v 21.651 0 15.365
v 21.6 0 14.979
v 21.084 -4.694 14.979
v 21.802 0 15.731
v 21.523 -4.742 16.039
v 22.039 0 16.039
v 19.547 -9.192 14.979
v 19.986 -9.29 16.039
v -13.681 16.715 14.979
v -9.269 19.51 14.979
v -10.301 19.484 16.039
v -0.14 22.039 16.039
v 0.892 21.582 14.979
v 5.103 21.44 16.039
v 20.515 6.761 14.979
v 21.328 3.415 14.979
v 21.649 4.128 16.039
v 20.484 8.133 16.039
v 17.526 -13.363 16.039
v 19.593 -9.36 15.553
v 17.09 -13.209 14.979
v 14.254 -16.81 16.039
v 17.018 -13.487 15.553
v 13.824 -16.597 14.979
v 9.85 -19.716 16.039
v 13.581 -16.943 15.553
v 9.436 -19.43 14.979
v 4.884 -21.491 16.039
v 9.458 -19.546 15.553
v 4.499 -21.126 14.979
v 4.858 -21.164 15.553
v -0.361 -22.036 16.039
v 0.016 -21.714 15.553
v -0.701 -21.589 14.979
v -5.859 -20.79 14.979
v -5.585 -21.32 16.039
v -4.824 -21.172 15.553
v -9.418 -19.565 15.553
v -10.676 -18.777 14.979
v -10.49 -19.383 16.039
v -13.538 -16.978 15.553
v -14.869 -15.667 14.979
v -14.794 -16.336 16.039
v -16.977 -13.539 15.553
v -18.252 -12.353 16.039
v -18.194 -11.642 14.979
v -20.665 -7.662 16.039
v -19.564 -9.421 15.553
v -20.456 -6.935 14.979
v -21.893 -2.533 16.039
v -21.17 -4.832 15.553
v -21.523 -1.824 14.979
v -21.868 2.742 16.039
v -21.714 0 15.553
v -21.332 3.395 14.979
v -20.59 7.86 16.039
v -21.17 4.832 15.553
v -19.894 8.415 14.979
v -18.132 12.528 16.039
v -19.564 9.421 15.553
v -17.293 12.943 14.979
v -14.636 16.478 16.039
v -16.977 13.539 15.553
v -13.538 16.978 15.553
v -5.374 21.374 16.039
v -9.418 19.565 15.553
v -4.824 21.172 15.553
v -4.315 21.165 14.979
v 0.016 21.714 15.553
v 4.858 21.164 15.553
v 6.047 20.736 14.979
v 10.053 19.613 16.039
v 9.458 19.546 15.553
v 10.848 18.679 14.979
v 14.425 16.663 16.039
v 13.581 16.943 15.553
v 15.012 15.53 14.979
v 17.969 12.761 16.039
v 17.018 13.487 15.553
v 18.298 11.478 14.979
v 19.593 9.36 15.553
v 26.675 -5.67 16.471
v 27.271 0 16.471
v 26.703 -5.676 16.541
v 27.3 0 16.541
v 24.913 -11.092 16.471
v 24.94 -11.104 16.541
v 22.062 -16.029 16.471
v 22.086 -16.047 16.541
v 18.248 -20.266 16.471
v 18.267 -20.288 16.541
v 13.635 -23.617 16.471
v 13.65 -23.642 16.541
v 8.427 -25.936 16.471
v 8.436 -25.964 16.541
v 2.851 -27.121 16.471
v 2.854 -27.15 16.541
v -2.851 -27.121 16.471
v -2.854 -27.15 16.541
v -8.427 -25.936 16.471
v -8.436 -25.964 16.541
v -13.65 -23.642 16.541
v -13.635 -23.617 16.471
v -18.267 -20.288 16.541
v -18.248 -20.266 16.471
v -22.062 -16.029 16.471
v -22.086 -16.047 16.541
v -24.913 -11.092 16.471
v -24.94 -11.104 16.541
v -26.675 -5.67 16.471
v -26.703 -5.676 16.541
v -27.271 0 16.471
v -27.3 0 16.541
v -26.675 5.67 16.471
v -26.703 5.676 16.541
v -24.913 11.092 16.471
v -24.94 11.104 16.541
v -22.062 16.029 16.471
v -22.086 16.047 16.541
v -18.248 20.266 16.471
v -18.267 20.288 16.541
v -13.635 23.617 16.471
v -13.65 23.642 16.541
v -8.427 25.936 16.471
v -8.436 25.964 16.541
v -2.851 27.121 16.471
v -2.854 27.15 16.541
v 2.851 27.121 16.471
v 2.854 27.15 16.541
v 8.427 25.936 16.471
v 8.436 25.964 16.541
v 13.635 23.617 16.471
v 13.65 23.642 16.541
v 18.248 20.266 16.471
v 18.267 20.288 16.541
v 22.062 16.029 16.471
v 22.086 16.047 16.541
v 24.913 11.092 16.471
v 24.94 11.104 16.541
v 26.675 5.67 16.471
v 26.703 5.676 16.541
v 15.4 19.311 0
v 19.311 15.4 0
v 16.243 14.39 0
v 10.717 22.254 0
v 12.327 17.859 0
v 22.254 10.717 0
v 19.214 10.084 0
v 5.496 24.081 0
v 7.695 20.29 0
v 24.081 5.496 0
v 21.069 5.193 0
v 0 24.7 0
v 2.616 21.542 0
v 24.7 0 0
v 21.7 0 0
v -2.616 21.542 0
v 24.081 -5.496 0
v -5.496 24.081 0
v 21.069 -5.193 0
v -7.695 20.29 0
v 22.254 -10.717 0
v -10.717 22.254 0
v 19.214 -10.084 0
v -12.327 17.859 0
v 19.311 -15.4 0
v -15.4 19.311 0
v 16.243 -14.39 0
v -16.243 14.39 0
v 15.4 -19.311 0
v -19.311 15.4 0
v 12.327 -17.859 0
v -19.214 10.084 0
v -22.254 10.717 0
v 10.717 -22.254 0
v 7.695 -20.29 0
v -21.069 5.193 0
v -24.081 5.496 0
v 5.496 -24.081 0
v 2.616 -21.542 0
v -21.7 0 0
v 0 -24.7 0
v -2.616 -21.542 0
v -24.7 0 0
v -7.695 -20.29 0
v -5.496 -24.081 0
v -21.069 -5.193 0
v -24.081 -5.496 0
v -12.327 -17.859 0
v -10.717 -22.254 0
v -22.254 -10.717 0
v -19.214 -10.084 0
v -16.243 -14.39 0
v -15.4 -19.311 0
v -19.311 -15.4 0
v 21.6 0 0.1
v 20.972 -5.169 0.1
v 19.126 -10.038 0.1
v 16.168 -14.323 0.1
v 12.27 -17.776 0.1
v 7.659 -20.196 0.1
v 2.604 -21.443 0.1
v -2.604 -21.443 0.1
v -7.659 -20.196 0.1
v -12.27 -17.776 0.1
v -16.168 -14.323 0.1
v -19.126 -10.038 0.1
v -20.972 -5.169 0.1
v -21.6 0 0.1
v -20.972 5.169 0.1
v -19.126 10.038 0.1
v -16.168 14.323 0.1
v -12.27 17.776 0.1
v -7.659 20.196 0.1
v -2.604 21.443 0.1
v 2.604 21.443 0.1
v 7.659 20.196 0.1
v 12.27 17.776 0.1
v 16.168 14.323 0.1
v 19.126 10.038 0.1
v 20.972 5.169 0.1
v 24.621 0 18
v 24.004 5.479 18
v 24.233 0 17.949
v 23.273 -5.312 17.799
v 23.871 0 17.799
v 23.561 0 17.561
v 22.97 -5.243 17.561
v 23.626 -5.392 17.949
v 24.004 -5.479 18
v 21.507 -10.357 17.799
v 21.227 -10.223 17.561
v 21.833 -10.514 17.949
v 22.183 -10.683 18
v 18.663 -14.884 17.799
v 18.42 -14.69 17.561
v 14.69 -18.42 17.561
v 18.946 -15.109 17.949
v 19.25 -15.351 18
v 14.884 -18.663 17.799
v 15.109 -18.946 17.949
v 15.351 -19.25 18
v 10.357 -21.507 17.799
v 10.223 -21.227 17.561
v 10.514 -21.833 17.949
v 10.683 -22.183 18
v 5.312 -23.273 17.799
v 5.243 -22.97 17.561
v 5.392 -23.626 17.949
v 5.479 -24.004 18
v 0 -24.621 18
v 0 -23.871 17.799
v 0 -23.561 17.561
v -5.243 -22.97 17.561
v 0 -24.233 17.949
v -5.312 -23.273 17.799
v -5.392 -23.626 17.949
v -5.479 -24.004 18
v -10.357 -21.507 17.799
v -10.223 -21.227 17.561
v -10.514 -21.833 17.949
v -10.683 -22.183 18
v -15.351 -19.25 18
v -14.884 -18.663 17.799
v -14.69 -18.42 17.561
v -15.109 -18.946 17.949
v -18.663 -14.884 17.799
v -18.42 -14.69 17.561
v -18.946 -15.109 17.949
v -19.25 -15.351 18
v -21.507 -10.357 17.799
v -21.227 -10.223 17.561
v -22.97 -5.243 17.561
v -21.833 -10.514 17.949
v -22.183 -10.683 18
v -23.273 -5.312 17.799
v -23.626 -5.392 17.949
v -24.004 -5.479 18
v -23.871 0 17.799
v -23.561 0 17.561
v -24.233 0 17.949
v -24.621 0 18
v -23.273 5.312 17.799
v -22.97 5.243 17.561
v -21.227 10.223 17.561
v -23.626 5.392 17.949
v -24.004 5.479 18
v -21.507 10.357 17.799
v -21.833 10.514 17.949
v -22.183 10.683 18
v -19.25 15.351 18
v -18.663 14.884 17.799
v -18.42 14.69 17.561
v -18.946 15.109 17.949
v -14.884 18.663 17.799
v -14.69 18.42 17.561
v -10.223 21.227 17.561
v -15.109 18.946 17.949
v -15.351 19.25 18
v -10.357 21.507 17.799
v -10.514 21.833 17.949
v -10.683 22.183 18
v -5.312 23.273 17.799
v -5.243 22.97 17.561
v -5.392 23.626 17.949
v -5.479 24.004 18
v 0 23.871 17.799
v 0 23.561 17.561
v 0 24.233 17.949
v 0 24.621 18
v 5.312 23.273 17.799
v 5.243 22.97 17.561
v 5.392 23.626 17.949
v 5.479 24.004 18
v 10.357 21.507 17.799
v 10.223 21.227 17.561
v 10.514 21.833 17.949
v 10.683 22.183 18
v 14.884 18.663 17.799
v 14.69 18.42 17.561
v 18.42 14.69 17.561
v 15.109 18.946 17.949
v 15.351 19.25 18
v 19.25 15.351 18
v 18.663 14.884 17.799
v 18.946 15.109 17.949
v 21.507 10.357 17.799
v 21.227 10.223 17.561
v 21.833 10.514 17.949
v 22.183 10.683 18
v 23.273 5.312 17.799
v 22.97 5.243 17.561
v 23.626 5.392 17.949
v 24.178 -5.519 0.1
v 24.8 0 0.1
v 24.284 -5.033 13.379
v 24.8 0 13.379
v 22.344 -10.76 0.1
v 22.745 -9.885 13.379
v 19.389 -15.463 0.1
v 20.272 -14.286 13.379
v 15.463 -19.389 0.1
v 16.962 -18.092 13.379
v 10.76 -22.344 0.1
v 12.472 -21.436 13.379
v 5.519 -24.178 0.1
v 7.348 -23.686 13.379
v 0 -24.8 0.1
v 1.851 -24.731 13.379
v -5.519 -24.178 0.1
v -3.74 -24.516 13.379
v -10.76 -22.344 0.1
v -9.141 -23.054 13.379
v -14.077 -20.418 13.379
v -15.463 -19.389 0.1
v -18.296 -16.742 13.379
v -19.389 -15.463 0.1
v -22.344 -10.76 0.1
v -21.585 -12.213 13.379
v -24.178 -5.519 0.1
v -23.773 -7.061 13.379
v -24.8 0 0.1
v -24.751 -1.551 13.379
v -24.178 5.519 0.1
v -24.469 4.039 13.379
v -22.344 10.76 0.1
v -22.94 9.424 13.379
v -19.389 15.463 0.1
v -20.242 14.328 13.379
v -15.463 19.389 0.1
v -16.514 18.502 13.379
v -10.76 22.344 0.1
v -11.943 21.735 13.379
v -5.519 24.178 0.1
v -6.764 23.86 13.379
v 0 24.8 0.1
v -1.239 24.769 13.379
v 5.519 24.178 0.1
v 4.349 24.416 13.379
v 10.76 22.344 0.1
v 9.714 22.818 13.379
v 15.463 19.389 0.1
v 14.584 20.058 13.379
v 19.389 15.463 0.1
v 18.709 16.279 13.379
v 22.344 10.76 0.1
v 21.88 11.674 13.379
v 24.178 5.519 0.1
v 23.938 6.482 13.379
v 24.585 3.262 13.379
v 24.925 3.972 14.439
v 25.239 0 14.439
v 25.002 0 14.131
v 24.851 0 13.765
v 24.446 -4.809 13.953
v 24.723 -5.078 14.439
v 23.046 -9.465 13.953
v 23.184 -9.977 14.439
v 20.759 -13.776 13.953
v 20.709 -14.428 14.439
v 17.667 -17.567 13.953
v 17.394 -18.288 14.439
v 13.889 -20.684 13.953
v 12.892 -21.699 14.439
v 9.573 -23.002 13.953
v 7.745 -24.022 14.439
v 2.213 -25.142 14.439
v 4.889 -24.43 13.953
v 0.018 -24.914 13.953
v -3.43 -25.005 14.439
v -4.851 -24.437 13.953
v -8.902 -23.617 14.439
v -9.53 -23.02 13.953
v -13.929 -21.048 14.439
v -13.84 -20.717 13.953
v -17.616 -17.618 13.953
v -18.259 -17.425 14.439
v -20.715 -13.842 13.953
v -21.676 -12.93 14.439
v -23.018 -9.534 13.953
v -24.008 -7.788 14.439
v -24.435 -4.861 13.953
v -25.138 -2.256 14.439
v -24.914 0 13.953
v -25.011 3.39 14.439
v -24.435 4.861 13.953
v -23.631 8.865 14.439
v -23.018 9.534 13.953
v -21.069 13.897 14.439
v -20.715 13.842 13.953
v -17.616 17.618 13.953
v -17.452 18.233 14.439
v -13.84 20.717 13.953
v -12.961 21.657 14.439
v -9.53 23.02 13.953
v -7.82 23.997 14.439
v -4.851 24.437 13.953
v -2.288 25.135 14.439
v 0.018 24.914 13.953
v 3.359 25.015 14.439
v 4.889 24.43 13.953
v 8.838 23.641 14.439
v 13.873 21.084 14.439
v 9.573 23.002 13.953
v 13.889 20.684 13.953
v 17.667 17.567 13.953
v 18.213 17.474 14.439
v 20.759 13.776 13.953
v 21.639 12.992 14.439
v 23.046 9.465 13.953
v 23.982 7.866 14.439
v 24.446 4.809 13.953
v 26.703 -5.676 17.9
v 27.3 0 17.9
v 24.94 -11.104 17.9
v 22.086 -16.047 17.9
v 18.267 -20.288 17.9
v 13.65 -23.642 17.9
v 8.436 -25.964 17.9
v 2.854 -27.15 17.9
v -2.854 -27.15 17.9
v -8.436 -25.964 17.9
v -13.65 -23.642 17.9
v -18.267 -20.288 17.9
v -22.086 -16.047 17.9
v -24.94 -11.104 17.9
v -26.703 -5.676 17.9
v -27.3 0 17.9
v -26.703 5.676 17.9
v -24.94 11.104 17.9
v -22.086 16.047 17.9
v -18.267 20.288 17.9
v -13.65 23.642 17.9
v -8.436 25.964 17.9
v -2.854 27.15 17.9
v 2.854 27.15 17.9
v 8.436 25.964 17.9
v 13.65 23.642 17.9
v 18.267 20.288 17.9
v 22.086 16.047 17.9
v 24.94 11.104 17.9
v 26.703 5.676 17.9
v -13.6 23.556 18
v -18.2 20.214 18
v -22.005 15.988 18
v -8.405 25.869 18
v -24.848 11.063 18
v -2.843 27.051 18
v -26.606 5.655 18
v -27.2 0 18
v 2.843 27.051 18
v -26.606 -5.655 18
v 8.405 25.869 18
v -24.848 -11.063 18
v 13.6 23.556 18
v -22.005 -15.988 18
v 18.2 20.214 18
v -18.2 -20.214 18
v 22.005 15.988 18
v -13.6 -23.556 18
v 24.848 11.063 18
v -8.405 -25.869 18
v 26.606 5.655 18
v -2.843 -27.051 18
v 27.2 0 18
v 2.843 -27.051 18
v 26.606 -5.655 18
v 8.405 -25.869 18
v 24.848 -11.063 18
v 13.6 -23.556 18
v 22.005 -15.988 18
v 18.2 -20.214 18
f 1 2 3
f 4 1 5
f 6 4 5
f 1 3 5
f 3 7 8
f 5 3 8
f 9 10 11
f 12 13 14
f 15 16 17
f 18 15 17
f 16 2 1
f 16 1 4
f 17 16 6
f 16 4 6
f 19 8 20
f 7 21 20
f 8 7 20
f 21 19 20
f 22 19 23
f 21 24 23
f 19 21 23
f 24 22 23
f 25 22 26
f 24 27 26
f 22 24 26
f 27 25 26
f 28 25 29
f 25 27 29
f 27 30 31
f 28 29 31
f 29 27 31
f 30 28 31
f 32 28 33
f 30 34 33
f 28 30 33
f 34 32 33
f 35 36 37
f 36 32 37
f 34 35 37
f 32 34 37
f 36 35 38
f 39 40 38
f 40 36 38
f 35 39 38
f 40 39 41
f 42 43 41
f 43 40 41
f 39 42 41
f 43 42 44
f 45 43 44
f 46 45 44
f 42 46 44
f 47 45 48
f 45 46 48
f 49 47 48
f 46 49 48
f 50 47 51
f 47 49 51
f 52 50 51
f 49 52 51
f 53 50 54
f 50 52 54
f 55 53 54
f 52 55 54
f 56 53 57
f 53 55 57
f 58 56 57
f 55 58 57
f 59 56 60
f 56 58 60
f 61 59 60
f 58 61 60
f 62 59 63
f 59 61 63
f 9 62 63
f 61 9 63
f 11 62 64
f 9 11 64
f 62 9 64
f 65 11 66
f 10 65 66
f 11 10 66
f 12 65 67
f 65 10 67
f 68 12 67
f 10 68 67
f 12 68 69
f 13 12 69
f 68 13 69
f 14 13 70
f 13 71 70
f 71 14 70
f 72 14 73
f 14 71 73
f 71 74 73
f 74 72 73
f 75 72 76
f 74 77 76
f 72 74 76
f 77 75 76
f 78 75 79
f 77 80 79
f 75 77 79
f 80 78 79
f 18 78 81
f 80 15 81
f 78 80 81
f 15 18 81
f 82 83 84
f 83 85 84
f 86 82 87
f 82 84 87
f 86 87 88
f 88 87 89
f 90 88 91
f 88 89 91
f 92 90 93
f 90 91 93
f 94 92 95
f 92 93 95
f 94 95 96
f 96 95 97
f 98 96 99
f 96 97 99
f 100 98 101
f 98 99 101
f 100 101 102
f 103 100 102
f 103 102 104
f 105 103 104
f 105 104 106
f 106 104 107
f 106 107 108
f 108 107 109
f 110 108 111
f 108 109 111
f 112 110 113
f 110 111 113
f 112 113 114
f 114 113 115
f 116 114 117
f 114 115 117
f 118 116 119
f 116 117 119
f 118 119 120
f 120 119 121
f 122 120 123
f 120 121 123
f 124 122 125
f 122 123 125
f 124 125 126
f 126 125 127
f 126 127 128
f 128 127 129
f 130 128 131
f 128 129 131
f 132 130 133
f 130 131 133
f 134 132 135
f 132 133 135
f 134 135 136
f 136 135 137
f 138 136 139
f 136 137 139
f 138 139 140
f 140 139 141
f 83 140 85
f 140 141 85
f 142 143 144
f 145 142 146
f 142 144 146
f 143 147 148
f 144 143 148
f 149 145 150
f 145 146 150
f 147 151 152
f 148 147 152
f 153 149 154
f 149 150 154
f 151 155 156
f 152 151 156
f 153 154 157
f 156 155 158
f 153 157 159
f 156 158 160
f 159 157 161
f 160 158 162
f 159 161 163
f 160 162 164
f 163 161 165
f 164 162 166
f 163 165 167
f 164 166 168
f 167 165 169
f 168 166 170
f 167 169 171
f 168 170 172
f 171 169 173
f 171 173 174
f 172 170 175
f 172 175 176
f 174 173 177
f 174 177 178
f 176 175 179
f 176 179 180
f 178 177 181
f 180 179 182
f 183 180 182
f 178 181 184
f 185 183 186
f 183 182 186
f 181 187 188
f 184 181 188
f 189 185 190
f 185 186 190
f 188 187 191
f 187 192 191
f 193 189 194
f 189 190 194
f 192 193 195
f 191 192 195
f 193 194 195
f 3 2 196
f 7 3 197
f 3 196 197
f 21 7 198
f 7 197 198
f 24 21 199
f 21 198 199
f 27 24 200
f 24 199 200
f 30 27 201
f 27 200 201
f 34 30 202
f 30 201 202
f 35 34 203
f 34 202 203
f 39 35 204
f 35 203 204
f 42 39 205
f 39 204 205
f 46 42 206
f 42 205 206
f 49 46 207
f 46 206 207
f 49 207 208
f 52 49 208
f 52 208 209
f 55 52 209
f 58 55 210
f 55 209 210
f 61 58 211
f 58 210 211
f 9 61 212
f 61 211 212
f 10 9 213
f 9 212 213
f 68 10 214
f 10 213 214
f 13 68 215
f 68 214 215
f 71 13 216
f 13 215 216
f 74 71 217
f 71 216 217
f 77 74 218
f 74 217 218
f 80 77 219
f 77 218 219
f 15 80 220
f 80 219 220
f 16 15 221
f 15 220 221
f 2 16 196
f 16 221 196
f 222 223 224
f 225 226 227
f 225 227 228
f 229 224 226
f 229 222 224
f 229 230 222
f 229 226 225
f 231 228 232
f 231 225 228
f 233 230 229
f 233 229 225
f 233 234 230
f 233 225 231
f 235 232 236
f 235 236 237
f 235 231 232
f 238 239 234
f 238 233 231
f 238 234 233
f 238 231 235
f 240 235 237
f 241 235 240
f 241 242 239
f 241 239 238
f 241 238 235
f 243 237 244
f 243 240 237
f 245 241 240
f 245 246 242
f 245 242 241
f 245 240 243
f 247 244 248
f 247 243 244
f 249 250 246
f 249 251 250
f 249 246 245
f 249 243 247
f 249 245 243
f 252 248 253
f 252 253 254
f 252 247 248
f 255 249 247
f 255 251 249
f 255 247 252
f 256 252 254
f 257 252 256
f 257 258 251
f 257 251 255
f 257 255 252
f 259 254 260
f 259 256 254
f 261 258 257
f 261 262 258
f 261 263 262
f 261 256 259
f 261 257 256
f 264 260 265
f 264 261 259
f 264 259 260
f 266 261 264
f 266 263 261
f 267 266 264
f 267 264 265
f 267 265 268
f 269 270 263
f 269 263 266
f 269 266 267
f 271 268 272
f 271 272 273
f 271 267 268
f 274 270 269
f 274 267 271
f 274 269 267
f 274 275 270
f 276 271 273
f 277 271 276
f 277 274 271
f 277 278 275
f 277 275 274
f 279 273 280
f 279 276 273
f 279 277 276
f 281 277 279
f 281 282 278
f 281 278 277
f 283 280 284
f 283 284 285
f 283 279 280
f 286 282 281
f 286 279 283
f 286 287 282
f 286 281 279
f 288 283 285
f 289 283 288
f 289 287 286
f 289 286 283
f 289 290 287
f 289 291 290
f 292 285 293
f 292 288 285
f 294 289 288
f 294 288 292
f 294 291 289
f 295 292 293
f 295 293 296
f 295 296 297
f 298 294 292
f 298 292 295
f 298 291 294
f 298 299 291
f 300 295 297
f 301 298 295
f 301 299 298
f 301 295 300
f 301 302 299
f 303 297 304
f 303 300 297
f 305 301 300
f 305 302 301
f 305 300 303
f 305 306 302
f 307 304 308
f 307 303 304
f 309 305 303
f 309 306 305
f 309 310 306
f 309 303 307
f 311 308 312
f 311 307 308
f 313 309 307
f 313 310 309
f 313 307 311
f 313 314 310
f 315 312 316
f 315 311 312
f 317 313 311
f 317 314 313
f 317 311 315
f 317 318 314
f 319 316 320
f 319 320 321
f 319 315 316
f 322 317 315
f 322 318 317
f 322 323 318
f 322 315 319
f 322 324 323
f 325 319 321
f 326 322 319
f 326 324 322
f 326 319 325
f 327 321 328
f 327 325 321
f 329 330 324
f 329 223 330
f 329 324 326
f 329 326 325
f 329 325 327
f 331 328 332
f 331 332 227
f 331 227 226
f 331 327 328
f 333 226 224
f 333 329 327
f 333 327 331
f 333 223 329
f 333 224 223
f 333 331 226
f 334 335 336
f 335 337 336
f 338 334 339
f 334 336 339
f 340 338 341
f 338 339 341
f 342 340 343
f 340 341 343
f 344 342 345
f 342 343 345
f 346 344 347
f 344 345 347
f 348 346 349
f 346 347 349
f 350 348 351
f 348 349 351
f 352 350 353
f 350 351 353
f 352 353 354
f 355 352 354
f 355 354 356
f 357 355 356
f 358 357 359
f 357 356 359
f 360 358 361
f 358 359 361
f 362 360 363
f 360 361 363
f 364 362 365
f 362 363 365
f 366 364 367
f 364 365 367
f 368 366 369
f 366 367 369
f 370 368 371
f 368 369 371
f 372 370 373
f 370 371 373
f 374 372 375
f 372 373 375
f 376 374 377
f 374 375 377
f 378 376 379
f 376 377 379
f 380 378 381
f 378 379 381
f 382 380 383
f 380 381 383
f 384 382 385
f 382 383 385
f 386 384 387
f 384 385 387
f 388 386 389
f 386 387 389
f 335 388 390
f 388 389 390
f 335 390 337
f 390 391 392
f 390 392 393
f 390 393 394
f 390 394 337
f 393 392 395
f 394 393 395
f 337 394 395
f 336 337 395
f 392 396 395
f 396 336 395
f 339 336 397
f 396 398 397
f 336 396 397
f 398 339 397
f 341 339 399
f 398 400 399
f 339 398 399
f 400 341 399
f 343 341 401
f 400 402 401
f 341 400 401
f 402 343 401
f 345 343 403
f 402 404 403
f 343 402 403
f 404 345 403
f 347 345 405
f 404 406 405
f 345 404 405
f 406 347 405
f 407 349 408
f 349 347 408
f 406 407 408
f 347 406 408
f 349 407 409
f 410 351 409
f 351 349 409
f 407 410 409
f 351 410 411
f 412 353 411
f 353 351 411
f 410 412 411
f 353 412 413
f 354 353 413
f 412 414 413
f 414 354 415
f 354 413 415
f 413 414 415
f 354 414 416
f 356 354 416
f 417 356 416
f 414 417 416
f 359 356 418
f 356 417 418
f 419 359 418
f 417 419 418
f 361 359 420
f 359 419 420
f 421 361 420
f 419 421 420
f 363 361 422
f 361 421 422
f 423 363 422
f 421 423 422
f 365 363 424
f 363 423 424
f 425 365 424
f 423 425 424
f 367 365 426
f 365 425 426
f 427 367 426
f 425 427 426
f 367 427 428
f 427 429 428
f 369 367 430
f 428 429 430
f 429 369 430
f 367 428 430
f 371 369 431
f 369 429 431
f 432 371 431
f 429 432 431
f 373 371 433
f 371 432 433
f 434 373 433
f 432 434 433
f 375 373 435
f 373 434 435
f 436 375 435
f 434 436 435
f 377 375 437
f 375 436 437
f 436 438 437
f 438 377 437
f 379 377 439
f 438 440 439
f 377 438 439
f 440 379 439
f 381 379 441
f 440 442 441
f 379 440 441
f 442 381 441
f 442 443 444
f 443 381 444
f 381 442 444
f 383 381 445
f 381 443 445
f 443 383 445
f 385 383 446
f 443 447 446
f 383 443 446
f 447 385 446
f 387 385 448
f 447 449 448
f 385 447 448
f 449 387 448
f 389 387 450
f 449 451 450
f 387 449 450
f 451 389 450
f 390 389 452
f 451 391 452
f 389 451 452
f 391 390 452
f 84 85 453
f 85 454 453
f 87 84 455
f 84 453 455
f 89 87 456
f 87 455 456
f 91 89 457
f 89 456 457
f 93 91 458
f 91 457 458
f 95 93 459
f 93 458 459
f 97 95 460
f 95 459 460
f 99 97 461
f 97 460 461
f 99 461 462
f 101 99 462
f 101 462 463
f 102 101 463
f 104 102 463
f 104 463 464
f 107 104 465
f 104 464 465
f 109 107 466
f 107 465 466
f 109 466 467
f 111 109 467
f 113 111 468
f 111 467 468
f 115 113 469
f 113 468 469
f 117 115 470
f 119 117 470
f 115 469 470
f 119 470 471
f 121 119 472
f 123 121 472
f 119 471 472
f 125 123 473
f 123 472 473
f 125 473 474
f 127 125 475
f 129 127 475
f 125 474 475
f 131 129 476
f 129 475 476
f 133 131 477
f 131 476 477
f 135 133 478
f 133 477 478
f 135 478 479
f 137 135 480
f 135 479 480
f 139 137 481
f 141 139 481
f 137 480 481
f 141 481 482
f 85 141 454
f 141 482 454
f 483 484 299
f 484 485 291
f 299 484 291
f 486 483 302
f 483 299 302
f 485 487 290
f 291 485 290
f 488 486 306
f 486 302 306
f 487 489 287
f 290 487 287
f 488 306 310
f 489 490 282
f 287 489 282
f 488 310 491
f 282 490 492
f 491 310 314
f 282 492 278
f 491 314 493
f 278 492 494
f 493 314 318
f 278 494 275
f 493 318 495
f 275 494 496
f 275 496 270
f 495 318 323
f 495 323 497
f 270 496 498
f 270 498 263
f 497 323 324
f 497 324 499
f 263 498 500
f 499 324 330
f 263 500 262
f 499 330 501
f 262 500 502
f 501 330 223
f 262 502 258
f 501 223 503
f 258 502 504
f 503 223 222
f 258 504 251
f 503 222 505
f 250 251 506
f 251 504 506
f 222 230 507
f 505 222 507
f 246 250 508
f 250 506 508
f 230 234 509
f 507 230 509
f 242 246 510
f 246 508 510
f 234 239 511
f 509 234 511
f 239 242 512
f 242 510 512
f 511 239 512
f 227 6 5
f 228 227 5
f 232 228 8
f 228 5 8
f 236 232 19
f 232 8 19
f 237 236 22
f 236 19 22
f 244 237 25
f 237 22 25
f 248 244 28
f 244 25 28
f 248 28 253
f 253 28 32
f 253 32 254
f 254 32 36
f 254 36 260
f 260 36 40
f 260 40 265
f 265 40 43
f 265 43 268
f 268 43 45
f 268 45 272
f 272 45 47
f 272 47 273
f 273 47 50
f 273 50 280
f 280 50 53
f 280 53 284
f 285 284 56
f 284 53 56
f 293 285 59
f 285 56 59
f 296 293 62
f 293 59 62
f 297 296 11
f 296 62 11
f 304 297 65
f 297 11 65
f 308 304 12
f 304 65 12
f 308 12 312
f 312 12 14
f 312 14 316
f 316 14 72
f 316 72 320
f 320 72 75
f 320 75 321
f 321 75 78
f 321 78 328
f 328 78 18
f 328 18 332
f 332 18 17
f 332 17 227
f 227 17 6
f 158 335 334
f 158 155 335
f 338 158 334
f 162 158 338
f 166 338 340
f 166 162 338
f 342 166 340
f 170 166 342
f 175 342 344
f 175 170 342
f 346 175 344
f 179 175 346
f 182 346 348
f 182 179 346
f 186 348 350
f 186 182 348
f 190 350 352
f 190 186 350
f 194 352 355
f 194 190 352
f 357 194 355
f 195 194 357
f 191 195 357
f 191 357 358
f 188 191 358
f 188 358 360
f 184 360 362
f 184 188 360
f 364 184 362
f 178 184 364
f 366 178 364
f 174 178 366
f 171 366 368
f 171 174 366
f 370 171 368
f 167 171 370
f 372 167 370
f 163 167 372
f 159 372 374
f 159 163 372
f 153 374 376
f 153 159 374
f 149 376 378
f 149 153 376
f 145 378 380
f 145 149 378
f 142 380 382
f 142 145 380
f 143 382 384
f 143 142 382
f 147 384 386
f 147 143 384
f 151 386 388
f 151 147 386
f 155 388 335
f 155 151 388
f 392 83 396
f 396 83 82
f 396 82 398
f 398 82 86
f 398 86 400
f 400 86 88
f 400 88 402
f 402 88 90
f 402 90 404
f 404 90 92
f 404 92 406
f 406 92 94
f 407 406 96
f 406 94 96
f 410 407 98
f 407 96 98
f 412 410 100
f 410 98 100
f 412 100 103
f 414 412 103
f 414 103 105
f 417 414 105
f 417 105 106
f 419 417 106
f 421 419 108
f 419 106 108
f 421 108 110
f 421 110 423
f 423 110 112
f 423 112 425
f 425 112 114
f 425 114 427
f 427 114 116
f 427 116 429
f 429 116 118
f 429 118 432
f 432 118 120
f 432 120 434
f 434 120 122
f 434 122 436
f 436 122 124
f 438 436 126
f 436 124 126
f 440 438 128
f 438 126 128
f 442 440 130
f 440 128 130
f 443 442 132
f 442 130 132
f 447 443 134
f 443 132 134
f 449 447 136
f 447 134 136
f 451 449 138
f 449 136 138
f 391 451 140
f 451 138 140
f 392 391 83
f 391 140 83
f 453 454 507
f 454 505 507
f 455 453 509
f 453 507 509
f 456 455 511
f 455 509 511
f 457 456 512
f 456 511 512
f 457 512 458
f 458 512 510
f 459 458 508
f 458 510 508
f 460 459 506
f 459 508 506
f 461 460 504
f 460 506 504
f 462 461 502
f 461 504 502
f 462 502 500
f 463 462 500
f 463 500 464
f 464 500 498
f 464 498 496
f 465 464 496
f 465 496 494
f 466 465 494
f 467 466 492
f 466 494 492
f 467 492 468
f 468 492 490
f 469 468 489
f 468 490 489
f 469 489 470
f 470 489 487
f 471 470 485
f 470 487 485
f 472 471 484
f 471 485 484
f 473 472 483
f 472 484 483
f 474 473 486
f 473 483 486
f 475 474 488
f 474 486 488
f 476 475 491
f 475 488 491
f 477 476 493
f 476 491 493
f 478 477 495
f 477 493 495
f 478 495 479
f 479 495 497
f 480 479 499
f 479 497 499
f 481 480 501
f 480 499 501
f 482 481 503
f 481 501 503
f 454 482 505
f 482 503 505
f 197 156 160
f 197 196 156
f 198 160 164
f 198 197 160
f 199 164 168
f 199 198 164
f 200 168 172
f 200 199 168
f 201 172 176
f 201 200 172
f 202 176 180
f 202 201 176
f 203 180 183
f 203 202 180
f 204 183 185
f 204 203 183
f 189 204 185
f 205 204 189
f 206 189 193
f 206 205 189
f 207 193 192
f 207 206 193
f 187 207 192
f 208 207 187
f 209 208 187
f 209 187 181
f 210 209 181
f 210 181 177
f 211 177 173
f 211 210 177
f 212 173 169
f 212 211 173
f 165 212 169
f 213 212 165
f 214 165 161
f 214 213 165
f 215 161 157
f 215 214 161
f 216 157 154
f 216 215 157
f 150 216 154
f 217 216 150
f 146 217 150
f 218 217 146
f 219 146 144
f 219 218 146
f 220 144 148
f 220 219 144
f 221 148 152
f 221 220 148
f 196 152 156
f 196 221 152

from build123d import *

# Parameters (mm, degrees)
F2_R = 1.5
F3_R = 1.5
F4_R = 1.5


# Not quite as in the source:
# - a fillet or chamfer that OpenCascade refuses, or shapes differently, is made with other operations: its cross-section is extruded or revolved along the edge and cut away or added


with BuildPart() as f1:
    # F0 (on Front) → F1 (revolve)
    with BuildSketch(Plane.XZ):
        Polygon((21.6, 15.6), (21.6, 0), (24.8, 0), (24.8, 14), (27.3, 16.5), (27.3, 18), (24, 18), align=None)
    revolve(axis=Axis((0, 0, 6.0077635571), (0, 0, -1)))

    # F2
    f2_edges = [f1.edges().sort_by_distance(p)[0] for p in [
        (-21.6, 0, 15.6),
    ]]
    fillet(f2_edges, radius=F2_R)

    # F3
    f3_edges = [f1.edges().sort_by_distance(p)[0] for p in [
        (-24, 0, 18),
    ]]
    fillet(f3_edges, radius=F3_R)

    # F4
    f4_edges = [f1.edges().sort_by_distance(p)[0] for p in [
        (-24.8, 0, 14),
    ]]
    fillet(f4_edges, radius=F4_R)

    # F5: chamfer of 0.1 on 5 edges, made by hand

    # F5_s1 → F5_t2 (revolve, cut)
    with BuildSketch(Plane.XZ):
        Polygon((27.3, 17.9), (27.2, 18), (27.3, 18), align=None)
    revolve(axis=Axis((0, 0, 18), (0, 0, -1)), mode=Mode.SUBTRACT)

    # F5_s3 → F5_t4 (revolve, cut)
    with BuildSketch(Plane.XZ):
        Polygon((27.2707106781, 16.4707106781), (27.3, 16.5414213562), (27.3, 16.5), align=None)
    revolve(axis=Axis((0, 0, 16.5), (0, 0, -1)), mode=Mode.SUBTRACT)

    # F5_s5 → F5_t6 (revolve, cut)
    with BuildSketch(Plane.XZ):
        Polygon((24.8, 0.1), (24.7, 0), (24.8, 0), align=None)
    revolve(axis=Axis((0, 0, 0), (0, 0, -1)), mode=Mode.SUBTRACT)

    # F5_s7 → F5_t8 (revolve, cut)
    with BuildSketch(Plane.XZ):
        Polygon((21.7, 0), (21.6, 0.1), (21.6, 0), align=None)
    revolve(axis=Axis((0, 0, 0), (0, 0, -1)), mode=Mode.SUBTRACT)


solid = f1.part
